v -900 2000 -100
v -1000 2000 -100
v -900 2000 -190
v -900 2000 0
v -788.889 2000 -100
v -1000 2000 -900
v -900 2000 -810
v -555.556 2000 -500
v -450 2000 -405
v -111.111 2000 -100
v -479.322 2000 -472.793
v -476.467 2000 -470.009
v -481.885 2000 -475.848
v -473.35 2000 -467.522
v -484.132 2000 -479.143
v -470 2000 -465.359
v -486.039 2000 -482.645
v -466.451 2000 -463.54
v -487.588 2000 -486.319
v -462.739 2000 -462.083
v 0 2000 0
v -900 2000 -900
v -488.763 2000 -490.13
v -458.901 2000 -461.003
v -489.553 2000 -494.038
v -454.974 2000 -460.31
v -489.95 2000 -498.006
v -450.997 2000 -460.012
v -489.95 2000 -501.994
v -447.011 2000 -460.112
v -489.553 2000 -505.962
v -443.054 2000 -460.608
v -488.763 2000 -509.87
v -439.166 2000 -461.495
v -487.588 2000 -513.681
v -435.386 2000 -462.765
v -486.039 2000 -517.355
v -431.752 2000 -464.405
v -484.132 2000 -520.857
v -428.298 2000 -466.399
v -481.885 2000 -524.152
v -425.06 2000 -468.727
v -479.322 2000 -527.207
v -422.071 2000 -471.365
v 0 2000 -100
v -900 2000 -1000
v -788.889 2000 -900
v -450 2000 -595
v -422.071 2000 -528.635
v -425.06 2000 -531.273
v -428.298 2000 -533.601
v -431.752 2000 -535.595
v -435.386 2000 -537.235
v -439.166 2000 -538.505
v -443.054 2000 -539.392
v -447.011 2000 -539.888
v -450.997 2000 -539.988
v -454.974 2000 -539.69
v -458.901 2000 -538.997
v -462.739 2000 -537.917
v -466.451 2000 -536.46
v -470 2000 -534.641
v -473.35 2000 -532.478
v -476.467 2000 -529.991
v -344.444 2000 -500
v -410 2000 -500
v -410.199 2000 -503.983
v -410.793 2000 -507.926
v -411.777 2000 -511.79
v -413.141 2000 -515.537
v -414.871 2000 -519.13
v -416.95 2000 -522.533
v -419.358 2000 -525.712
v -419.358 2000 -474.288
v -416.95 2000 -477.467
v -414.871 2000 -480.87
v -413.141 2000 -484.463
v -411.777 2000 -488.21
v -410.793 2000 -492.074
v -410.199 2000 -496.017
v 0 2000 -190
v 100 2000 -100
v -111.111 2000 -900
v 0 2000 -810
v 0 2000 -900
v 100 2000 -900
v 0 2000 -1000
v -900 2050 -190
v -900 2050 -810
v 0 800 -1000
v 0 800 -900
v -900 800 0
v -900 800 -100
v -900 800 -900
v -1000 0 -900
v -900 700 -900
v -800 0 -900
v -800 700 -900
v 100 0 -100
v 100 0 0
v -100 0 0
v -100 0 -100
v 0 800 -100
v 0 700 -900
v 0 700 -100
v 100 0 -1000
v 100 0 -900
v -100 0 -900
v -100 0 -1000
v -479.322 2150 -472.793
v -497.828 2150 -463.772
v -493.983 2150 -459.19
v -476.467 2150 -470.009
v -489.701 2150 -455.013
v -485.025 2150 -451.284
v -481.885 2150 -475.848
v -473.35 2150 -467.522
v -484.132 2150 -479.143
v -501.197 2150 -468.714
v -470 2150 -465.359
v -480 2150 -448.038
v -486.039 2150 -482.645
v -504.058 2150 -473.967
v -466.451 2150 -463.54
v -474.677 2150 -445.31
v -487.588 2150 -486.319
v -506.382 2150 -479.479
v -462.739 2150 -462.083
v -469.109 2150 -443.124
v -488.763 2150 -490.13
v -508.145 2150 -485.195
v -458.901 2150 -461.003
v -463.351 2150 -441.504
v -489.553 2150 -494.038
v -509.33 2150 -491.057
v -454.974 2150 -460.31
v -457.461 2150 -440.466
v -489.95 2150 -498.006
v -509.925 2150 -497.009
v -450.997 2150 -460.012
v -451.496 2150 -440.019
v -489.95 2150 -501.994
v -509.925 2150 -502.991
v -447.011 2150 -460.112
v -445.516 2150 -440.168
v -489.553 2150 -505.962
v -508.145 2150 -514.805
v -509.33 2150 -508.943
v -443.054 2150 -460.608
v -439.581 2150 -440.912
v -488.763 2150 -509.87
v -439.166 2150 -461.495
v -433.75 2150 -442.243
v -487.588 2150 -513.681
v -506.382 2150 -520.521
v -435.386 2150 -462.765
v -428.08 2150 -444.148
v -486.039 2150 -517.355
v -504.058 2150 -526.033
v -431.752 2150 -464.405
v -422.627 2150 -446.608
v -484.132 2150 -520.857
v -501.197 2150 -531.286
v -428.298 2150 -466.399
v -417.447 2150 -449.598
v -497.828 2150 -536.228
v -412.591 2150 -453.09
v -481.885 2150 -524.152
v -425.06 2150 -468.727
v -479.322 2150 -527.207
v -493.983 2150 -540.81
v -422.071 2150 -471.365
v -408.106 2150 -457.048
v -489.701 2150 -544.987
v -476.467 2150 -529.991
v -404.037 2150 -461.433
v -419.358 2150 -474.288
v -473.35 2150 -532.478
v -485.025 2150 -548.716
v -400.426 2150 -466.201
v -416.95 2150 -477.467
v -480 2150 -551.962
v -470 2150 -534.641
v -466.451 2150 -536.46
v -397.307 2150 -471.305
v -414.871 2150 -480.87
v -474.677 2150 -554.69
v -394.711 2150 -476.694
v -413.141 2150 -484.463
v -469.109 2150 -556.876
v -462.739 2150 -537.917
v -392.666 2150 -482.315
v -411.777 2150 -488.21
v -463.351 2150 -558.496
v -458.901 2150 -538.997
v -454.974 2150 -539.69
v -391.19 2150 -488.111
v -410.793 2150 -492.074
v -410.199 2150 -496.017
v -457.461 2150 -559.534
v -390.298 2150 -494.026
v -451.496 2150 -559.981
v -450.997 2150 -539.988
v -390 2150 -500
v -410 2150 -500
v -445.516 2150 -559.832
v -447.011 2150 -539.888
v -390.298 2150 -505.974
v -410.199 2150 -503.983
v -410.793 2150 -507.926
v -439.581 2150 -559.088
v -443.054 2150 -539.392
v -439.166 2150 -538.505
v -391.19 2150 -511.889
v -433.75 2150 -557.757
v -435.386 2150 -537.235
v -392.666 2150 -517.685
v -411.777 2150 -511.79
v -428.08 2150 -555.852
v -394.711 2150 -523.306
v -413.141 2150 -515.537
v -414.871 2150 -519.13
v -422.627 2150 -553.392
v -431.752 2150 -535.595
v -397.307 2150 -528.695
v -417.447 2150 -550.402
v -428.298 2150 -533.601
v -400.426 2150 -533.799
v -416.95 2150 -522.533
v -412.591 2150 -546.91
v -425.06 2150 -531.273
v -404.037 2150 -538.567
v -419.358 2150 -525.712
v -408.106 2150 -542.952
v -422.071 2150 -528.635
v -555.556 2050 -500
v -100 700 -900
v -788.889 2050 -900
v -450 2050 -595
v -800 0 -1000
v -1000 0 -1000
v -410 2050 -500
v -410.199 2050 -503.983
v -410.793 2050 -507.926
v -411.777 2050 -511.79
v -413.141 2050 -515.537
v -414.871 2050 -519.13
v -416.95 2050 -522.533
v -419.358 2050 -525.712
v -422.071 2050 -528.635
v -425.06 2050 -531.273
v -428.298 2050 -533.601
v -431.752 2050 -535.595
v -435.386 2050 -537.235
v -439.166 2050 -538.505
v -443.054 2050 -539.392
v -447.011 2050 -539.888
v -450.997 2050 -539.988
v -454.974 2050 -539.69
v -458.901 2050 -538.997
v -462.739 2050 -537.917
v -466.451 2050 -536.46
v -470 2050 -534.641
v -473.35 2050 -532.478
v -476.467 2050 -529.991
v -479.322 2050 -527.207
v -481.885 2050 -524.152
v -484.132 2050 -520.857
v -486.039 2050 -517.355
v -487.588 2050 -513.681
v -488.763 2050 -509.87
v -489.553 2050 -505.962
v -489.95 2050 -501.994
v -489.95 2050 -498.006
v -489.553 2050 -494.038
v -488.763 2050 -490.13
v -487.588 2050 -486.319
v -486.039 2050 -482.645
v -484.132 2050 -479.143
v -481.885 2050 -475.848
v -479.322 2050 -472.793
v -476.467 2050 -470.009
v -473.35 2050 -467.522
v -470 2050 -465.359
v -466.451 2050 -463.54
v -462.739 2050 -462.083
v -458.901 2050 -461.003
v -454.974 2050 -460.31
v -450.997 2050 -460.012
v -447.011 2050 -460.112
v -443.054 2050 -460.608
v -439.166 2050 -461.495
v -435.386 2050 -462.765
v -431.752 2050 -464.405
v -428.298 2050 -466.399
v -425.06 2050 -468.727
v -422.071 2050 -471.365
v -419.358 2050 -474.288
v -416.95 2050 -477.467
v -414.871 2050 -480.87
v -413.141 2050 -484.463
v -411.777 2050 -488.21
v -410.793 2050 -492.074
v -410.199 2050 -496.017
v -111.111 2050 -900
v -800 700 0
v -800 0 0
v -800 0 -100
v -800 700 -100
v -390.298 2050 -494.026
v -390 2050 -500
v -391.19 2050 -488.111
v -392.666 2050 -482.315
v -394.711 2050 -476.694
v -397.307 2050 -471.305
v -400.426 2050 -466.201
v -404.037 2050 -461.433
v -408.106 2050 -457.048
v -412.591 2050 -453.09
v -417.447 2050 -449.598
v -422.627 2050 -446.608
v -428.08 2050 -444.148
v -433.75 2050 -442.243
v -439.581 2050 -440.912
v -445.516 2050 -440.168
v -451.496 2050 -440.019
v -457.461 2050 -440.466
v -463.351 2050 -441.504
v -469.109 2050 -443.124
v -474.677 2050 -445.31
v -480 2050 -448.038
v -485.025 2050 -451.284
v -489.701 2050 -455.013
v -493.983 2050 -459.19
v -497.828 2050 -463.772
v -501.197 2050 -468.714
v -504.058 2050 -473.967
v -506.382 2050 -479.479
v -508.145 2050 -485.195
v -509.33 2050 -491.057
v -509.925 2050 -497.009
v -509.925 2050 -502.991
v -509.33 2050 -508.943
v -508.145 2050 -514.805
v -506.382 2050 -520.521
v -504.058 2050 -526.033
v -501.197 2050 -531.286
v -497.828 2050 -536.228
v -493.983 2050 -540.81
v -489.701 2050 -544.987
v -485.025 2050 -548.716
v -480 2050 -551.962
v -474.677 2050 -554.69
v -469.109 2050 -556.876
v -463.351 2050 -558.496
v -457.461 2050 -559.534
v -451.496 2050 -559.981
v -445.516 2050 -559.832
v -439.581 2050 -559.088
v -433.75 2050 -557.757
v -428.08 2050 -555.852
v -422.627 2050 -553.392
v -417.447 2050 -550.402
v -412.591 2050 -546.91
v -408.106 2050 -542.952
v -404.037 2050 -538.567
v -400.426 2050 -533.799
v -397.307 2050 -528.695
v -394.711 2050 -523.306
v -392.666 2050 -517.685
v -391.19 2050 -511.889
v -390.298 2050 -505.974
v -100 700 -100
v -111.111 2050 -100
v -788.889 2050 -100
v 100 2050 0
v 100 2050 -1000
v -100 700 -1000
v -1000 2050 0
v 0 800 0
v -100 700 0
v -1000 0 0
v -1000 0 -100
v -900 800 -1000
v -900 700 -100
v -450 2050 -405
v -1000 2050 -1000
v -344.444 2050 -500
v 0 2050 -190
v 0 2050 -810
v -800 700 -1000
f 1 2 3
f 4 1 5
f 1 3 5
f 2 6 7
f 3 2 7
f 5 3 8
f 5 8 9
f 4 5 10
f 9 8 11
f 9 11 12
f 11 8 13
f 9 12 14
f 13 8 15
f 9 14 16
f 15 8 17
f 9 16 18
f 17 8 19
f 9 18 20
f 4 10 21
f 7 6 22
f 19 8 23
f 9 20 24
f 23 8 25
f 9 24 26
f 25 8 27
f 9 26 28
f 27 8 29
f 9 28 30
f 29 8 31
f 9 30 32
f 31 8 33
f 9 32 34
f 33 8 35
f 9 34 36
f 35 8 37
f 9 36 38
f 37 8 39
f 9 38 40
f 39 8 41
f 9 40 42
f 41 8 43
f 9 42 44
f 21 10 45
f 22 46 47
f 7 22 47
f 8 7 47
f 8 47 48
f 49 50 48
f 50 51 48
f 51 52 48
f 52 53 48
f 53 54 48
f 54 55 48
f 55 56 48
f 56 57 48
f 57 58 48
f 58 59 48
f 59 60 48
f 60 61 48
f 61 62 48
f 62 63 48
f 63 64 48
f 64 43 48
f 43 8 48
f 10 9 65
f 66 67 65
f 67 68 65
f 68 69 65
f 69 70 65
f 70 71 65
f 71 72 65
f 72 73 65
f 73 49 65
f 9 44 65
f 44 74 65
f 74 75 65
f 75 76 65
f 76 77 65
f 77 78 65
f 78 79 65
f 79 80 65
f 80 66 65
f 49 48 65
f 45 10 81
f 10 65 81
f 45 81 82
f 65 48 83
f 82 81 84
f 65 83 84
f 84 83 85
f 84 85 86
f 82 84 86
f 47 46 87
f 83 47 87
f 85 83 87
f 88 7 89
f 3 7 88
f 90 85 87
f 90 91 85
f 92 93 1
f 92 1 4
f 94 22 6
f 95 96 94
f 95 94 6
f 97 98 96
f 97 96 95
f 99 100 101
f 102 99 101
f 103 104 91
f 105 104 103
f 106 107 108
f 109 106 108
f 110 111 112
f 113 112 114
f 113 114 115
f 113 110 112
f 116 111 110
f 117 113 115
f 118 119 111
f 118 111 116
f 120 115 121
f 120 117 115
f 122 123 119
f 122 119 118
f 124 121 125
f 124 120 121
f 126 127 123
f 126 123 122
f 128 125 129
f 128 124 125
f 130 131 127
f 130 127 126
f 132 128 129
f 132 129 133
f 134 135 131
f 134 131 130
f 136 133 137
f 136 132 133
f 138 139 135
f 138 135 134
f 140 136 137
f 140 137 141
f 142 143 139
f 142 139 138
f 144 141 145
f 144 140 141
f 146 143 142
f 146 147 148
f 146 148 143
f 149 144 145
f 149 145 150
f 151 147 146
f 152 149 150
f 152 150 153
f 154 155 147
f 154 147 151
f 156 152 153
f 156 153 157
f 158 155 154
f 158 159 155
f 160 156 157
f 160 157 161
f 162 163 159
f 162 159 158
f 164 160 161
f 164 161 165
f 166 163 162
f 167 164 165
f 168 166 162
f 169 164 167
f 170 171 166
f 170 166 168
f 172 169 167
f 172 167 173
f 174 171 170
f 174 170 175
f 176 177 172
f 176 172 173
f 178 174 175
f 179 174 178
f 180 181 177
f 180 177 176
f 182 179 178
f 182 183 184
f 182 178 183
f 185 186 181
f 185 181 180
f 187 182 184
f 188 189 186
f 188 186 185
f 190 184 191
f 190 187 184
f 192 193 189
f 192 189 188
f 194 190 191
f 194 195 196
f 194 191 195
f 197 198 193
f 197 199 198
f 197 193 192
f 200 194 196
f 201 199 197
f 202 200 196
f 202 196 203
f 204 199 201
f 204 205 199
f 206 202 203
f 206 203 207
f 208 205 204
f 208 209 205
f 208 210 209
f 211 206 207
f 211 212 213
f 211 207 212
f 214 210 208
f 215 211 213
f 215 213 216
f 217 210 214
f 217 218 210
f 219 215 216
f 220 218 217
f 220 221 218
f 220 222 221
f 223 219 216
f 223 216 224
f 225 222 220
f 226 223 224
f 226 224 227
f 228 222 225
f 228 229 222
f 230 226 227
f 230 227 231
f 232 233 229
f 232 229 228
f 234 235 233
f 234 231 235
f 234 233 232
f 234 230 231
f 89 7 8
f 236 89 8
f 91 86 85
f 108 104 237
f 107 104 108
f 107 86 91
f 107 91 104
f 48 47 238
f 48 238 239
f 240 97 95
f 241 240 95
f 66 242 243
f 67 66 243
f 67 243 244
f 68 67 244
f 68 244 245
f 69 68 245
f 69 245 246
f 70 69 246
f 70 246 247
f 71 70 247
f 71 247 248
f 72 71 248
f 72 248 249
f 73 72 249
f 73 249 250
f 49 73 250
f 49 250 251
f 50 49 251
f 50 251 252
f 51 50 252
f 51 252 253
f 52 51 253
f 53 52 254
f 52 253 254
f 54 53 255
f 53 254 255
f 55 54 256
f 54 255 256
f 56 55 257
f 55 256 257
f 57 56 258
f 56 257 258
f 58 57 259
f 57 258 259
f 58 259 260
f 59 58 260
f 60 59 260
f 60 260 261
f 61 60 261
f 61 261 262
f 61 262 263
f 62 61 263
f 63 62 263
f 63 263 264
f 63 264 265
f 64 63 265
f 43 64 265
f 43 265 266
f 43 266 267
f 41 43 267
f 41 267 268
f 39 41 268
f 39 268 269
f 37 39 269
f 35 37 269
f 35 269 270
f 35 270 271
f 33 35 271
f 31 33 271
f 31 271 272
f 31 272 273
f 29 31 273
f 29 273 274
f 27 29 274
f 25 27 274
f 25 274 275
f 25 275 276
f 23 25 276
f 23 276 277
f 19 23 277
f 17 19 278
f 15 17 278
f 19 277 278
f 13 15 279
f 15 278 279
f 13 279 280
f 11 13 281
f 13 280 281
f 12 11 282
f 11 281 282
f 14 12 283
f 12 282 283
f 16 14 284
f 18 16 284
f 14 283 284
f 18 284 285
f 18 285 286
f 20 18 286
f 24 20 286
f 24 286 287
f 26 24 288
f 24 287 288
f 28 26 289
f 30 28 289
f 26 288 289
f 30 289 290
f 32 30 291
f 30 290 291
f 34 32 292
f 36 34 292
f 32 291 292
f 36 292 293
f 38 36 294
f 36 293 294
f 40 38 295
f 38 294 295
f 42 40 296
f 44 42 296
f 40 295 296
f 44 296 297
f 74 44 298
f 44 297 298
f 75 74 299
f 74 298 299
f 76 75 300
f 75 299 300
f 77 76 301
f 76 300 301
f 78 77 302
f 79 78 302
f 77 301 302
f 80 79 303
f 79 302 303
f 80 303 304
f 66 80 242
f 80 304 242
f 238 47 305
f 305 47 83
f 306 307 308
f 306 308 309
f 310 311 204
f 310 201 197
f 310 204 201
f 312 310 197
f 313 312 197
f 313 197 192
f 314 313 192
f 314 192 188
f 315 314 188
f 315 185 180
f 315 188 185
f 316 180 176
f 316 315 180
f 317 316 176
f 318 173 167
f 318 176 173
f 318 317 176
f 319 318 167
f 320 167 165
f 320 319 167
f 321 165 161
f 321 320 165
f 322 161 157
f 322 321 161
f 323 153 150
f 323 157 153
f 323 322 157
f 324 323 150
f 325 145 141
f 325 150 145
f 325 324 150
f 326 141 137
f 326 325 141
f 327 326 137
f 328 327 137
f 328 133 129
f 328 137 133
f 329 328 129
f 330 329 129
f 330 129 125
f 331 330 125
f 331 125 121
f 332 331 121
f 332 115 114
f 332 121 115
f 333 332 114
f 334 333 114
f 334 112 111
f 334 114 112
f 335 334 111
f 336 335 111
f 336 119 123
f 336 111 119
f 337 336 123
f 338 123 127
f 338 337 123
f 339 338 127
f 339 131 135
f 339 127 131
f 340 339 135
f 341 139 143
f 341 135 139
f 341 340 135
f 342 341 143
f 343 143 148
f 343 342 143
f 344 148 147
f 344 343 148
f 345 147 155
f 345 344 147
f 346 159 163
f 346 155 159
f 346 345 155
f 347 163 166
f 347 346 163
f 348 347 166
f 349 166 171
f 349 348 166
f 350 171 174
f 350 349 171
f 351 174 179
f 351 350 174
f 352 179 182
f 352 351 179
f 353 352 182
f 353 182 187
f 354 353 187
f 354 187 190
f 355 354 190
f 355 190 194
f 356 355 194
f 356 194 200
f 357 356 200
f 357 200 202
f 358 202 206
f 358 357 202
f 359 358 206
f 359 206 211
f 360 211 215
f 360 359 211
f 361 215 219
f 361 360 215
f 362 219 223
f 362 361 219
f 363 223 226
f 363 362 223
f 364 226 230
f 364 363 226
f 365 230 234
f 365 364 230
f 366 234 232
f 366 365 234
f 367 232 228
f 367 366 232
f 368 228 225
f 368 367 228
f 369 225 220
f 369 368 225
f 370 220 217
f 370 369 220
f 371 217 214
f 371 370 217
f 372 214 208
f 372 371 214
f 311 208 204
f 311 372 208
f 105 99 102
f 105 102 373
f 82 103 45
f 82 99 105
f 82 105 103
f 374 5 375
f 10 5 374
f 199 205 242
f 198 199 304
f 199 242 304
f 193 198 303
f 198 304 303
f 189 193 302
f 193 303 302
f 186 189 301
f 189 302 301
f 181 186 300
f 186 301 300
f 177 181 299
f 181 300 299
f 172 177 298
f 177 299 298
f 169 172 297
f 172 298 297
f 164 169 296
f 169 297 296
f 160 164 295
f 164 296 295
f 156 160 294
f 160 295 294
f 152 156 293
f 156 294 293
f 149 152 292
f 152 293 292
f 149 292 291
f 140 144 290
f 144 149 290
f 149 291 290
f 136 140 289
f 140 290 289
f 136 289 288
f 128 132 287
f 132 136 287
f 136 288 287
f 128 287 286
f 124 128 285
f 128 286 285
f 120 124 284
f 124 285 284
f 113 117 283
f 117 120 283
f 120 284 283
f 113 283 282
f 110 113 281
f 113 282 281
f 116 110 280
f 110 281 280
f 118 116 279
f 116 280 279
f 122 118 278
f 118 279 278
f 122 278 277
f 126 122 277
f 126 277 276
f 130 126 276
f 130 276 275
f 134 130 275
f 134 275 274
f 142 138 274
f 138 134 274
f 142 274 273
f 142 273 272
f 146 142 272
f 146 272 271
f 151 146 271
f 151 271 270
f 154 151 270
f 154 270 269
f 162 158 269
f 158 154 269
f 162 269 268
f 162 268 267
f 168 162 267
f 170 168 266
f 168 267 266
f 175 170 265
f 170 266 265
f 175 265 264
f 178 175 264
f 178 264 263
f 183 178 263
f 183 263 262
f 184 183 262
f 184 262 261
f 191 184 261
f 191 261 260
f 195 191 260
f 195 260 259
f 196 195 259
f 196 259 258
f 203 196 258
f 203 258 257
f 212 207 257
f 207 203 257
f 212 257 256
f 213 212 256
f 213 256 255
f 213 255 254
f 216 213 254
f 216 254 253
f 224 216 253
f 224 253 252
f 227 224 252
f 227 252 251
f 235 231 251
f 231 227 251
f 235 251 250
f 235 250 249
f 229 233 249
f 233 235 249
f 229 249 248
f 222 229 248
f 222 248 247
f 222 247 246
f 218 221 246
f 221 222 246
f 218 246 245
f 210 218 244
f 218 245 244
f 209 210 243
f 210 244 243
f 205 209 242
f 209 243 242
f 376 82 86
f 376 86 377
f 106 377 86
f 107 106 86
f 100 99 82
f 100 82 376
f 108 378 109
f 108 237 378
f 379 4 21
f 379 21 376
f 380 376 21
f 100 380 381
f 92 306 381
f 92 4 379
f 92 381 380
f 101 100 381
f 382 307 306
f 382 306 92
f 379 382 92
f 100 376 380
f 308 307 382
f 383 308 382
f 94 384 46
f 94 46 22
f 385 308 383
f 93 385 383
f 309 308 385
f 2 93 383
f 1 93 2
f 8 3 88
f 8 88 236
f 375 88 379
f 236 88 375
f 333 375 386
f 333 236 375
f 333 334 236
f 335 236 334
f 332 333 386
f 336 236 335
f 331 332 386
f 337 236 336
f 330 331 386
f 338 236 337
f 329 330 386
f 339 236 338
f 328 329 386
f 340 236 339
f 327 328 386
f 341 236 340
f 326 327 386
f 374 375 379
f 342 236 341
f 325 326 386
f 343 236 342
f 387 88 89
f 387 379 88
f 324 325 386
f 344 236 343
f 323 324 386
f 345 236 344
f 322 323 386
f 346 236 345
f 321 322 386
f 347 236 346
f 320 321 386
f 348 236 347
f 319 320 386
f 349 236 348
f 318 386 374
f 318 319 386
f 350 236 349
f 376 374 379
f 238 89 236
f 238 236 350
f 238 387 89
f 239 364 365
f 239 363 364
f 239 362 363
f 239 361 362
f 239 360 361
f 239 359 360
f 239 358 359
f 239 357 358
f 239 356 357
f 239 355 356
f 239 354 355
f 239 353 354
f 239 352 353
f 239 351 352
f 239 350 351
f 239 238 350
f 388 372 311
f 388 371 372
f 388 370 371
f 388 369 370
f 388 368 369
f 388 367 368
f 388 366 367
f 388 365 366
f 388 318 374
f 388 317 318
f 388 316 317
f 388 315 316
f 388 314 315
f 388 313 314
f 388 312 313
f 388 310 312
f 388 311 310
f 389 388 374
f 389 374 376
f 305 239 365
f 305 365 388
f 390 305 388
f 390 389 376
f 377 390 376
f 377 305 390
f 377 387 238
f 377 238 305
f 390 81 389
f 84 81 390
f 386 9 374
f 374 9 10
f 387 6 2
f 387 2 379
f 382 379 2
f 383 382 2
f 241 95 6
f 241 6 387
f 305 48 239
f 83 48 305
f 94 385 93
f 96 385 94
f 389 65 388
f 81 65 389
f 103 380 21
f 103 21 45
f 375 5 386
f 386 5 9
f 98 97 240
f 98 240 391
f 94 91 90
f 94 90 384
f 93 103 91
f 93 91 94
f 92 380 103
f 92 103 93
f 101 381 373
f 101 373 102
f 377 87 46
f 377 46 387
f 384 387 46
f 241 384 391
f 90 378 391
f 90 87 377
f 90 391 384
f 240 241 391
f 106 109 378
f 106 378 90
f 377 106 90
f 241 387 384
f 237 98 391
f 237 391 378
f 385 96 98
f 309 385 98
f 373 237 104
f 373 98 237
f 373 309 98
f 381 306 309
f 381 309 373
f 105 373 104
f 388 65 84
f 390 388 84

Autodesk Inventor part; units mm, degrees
ref_plane "YZ Plane" through (0, 0, 0) normal (1, 0, 0) x (0, 1, 0)
ref_plane "XZ Plane" through (0, 0, 0) normal (0, 1, 0) x (-1, 0, 0)
ref_plane "XY Plane" through (0, 0, 0) normal (0, 0, 1) x (1, 0, 0)
sketch "Sketch2" plane through (0, 0, 0) normal (0, 1, 0) x (-1, 0, 0)
  line L0 (0, 0) -> (900, 0)
  line L1 (900, 0) -> (900, -1000)
  line L2 (900, -1000) -> (0, -1000)
  line L3 (0, -1000) -> (0, 0)
  dimension "d0" = 900
  dimension "d1" = 1000
extrude "Extrusion1" add sketch "Sketch2" along normal blind 800
sketch "Sketch3" plane through (-900, 0, 0) normal (0, 0, 1) x (1, 0, 0)
  line L0 (900, 0) -> (0, 0) projected
  line L1 (0, 0) -> (100, 0)
  line L2 (900, 0) -> (900, 800) projected
  line L3 (900, 0) -> (800, 0)
  line L4 (800, 0) -> (100, 0)
  line L5 (100, 0) -> (100, 700)
  line L6 (100, 700) -> (800, 700)
  line L7 (800, 700) -> (800, 0)
  dimension "d4" = 100
  dimension "d5" = 100
  dimension "d6" = 700
extrude "Extrusion2" cut sketch "Sketch3" against normal through all
sketch "Sketch4" plane through (0, 0, 0) normal (1, 0, 0) x (0, 0, -1)
  line L0 (0, 0) -> (100, 0)
  line L1 (1000, 0) -> (0, 0) projected
  line L2 (1000, 0) -> (900, 0)
  line L3 (0, 700) -> (1000, 700) projected
  line L4 (900, 0) -> (100, 0)
  line L5 (100, 0) -> (100, 700)
  line L6 (100, 700) -> (900, 700)
  line L7 (900, 700) -> (900, 0)
  dimension "d9" = 100
  dimension "d10" = 100
extrude "Extrusion3" cut sketch "Sketch4" against normal through all
sketch "Sketch5" plane through (0, 0, 0) normal (0, -1, 0) x (1, 0, 0)
  line L0 (-900, -100) -> (-800, -100) projected
  line L1 (-800, -100) -> (-800, 0) projected
  line L2 (-900, 0) -> (-800, 0) projected
  line L3 (-900, -100) -> (-900, 0) projected
  line L4 (-800, -900) -> (-900, -900) projected
  line L5 (-900, -1000) -> (-900, -900) projected
  line L6 (-800, -1000) -> (-900, -1000) projected
  line L7 (-800, -1000) -> (-800, -900) projected
  line L8 (0, -900) -> (-100, -900) projected
  line L9 (-100, -900) -> (-100, -1000) projected
  line L10 (0, -1000) -> (-100, -1000) projected
  line L11 (0, -900) -> (0, -1000) projected
  line L12 (-100, -100) -> (0, -100) projected
  line L13 (0, 0) -> (0, -100) projected
  line L14 (-100, 0) -> (0, 0) projected
  line L15 (-100, 0) -> (-100, -100) projected
  line L16 (0, -100) -> (-100, -100) projected
  line L17 (0, -100) -> (100, -100)
  line L18 (100, -100) -> (100, 0)
  line L19 (100, 0) -> (0, 0)
  line L20 (0, 0) -> (0, -100)
  line L21 (0, -900) -> (100, -900)
  line L22 (100, -900) -> (100, -1000)
  line L23 (100, -1000) -> (0, -1000)
  line L24 (0, -1000) -> (0, -900)
  line L25 (-900, -1000) -> (-1000, -1000)
  line L26 (-1000, -1000) -> (-1000, -900)
  line L27 (-1000, -900) -> (-900, -900)
  line L28 (-900, -900) -> (-900, -1000)
  line L29 (-900, 0) -> (-1000, 0)
  line L30 (-1000, 0) -> (-1000, -100)
  line L31 (-1000, -100) -> (-900, -100)
  line L32 (-900, -100) -> (-900, 0)
  dimension "d13" = 100
  dimension "d14" = 100
extrude "Extrusion4" add sketch "Sketch5" against normal blind 2000 contours L31 L30 L29 L3 | L5 L25 L26 L27 | L21 L22 L23 L11 | L13 L19 L18 L17
sketch "Sketch6" plane through (0, 2000, 0) normal (0, 1, 0) x (1, 0, 0)
  line L0 (-1000, 1000) -> (-1000, 900) projected
  line L1 (100, 0) -> (100, 100) projected
  line L2 (-1000, 0) -> (-900, 0) projected
  line L3 (100, 1000) -> (100, 900) projected
  line L4 (100, 1000) -> (-100, 1000) projected
  line L5 (-1000, 0) -> (100, 0)
  line L6 (100, 0) -> (100, 1000)
  line L7 (100, 1000) -> (-1000, 1000)
  line L8 (-1000, 1000) -> (-1000, 0)
  line L9 (-1000, 0) -> (100, 1000) construction
  line L10 (100, 0) -> (-1000, 1000) construction
  line L11 (-1000, 1000) -> (-900, 1000)
  line L12 (-900, 1000) -> (-900, 0)
  line L13 (-900, 0) -> (-1000, 0)
  line L14 (-1000, 0) -> (-1000, 1000)
  line L15 (100, 0) -> (-1000, 0)
  line L16 (-1000, 0) -> (-1000, 100)
  line L17 (-1000, 100) -> (100, 100)
  line L18 (100, 100) -> (100, 0)
  line L19 (0, 1000) -> (100, 1000)
  line L20 (100, 1000) -> (100, 0)
  line L21 (100, 0) -> (0, 0)
  line L22 (0, 0) -> (0, 1000)
  line L23 (-1000, 900) -> (100, 900)
  line L24 (100, 900) -> (100, 1000)
  line L25 (100, 1000) -> (-1000, 1000)
  line L26 (-1000, 1000) -> (-1000, 900)
  line L27 (-1000, 900) -> (0, 0)
  line L28 (-900, 1000) -> (100, 100)
  line L29 (-1000, 100) -> (0, 1000)
  line L30 (-900, 0) -> (100, 900)
  point P0 (-450, 500)
  point P1 (-788.8889, 100)
  point P2 (-450, 405)
  point P3 (-111.1111, 100)
  point P4 (-100, 1000)
  point P5 (-111.1111, 900)
  point P6 (-450, 595)
  point P7 (-788.8889, 900)
  point P8 (0, 810)
  point P9 (0, 190)
  point P10 (-344.4444, 500)
  point P11 (-900, 190)
  point P12 (-900, 810)
  point P13 (-555.5556, 500)
extrude "Extrusion5" add sketch "Sketch6" along normal blind 50 contours L7 L12 L23 L0 | L27 L12 L29 L8 | L23 L12 L27 | L28 L23 L12 | L7 L4 L29 L23 L28 | L17 L12 L2 L8 | L29 L12 L17 | L23 L28 L29 L27 L12 | L17 L30 L12 | L12 L29 L27 L30 L17 | L29 L28 L30 L27 | L4 L3 L23 L22 | L22 L23 L29 | L23 L22 L30 L28 L29 | L30 L17 L27 L5 | L30 L28 L22 L17 L27 | L23 L30 L22 | L22 L17 L1 L5 | L27 L17 L22 | L6 L28 L22 L30 | L28 L17 L22
sketch "Sketch7" plane through (0, 2050, 0) normal (0, 1, 0) x (1, 0, 0)
  line L0 (-555.5556, 500) -> (-900, 190) projected
  line L1 (0, 190) -> (-344.4444, 500) projected
  line L2 (-555.5556, 500) -> (-344.4444, 500)
  line L3 (-111.1111, 900) -> (-450, 595) projected
  line L4 (-450, 405) -> (-111.1111, 100) projected
  line L5 (-450, 595) -> (-450, 405)
  circle A0 centre (-450, 500) radius 50
  circle A1 centre (-450, 500) radius 40
  point P0 (0, 0)
  dimension "d19" = 100
  dimension "d20" = 80
extrude "Extrusion6" cut sketch "Sketch7" against normal blind 200 contours A1 L5 L2 | L2 L5 A1 | L5 A1 L2 | L2 A1 L5
sketch "Sketch8" plane through (0, 2050, 0) normal (0, 1, 0) x (1, 0, 0)
  circle A0 centre (-450, 500) radius 40 projected
  circle A1 centre (-450, 500) radius 60
  point P0 (0, 0)
  dimension "d23" = 120
extrude "Extrusion7" add sketch "Sketch8" along normal blind 100
properties part number "Soporte_Corte"
